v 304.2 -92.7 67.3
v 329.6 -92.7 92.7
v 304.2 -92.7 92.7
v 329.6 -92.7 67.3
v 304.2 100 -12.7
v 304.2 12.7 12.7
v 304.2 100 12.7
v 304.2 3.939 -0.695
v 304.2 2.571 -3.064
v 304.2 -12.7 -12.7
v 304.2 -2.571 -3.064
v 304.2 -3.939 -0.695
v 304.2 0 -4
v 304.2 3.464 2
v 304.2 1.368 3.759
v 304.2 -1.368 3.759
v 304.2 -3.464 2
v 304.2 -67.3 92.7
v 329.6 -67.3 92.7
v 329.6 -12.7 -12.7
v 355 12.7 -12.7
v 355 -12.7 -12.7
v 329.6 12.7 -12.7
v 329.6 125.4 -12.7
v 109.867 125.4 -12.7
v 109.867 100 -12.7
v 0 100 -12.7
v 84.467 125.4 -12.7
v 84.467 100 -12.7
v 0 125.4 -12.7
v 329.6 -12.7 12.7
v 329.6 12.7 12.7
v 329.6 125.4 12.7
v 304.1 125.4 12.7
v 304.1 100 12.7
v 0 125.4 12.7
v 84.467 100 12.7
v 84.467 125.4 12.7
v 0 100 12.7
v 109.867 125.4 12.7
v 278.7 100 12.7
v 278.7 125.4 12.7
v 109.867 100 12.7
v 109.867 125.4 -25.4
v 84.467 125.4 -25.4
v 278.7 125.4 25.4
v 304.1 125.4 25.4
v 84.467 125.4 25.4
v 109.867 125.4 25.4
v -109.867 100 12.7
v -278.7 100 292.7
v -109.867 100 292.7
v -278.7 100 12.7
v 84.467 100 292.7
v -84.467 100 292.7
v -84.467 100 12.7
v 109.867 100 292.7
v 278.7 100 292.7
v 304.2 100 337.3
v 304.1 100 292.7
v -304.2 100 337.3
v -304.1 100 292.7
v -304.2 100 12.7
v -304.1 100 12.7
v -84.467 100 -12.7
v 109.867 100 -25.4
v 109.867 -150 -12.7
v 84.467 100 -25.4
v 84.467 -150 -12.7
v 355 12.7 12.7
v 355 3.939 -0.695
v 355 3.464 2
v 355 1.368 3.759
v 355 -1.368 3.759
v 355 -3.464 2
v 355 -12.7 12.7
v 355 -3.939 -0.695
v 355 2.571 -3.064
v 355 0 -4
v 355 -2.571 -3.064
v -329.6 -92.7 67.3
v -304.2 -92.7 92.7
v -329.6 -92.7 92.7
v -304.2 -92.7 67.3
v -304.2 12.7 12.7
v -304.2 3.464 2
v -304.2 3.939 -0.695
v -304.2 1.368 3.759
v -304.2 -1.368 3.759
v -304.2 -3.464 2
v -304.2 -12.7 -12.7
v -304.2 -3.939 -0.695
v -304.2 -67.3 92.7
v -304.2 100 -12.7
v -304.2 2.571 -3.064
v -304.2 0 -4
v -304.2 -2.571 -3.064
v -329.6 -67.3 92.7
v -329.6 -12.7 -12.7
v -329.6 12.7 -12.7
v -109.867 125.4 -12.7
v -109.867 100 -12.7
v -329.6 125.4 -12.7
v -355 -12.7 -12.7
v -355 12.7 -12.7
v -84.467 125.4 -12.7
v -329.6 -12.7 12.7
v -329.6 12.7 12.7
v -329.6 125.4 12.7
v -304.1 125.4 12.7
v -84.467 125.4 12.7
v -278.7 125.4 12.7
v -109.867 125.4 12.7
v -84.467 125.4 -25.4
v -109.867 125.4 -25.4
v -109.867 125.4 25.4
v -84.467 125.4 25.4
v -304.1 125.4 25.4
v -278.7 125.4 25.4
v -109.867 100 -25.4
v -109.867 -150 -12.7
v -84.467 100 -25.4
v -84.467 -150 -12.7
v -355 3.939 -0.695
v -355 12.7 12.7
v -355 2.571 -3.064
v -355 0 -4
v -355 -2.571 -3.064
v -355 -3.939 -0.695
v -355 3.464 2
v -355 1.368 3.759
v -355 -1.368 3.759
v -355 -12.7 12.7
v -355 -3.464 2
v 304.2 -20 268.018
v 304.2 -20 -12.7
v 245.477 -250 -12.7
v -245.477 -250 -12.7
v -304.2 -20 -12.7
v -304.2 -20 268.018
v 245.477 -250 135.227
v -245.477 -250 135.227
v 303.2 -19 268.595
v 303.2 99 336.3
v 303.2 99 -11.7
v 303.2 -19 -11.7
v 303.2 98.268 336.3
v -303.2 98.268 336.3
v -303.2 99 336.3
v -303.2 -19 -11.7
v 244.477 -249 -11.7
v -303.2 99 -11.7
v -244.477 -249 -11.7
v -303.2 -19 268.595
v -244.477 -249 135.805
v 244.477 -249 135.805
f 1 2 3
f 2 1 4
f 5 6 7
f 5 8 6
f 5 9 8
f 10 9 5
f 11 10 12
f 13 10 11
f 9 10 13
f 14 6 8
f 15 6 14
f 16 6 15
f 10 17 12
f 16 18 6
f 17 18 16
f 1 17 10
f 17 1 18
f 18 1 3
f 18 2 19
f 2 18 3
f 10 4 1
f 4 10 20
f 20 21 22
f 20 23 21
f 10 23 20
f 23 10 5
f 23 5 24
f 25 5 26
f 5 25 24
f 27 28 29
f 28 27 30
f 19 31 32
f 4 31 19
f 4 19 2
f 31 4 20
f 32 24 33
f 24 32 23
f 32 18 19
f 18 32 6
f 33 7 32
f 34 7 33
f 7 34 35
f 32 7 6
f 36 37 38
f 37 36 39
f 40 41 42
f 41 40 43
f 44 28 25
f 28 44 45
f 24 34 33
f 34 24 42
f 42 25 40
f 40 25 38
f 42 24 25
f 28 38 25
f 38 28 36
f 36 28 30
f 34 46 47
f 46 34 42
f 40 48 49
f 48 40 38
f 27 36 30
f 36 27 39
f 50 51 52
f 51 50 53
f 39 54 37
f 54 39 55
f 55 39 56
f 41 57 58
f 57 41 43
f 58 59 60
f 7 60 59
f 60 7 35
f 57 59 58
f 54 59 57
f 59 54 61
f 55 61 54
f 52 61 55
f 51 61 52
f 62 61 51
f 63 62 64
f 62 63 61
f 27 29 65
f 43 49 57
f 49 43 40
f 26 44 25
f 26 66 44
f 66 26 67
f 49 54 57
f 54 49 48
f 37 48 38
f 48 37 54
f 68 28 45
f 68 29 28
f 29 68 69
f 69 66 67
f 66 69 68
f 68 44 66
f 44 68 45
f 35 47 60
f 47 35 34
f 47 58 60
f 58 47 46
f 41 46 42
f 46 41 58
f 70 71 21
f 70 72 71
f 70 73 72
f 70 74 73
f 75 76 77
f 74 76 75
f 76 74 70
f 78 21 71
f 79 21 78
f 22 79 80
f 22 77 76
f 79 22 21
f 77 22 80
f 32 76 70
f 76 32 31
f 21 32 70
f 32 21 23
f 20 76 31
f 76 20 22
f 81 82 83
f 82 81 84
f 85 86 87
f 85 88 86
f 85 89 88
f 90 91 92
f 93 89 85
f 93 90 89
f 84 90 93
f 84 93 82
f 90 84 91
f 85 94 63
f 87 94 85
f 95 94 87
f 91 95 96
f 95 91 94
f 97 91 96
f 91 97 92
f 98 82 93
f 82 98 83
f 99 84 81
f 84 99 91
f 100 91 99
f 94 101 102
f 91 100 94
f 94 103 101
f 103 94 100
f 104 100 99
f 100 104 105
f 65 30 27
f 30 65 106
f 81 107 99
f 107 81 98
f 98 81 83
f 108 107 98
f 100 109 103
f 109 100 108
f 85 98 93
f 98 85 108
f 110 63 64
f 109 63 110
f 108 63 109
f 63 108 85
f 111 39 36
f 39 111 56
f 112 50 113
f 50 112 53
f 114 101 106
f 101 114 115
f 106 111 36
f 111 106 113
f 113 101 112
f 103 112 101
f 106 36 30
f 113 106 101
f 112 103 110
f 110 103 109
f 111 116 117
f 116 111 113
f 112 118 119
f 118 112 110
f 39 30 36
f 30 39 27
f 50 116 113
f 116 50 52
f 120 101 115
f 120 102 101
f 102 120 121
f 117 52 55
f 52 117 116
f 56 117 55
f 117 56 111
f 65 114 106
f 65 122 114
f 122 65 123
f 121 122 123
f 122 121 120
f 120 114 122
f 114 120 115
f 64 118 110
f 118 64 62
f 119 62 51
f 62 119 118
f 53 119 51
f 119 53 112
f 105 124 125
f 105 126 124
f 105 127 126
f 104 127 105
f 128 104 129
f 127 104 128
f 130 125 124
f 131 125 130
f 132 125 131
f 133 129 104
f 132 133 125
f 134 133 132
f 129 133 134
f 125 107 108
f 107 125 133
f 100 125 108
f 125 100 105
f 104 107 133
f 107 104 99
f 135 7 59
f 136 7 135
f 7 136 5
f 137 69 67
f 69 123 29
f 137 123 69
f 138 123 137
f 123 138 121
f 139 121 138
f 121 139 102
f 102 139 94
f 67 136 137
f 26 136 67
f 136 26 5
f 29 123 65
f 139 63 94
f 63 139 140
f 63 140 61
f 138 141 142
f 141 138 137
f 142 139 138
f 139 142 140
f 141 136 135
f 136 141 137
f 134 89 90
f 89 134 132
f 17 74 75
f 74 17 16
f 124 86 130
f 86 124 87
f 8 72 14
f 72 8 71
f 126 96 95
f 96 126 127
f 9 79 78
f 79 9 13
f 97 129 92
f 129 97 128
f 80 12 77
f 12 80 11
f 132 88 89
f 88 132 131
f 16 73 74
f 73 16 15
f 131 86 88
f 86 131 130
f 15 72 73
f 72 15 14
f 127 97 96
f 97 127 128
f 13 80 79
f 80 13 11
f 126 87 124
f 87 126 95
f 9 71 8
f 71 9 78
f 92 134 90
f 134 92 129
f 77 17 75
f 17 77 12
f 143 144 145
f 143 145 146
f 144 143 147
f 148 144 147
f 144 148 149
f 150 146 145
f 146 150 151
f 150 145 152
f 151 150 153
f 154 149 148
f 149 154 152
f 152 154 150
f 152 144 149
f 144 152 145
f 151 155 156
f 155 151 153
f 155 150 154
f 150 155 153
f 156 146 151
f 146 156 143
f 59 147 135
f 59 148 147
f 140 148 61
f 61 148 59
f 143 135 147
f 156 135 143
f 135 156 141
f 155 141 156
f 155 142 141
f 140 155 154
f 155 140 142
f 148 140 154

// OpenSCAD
$subpart=1;
include <../Excahaul_latest.scad>;
scoopBox(1);
